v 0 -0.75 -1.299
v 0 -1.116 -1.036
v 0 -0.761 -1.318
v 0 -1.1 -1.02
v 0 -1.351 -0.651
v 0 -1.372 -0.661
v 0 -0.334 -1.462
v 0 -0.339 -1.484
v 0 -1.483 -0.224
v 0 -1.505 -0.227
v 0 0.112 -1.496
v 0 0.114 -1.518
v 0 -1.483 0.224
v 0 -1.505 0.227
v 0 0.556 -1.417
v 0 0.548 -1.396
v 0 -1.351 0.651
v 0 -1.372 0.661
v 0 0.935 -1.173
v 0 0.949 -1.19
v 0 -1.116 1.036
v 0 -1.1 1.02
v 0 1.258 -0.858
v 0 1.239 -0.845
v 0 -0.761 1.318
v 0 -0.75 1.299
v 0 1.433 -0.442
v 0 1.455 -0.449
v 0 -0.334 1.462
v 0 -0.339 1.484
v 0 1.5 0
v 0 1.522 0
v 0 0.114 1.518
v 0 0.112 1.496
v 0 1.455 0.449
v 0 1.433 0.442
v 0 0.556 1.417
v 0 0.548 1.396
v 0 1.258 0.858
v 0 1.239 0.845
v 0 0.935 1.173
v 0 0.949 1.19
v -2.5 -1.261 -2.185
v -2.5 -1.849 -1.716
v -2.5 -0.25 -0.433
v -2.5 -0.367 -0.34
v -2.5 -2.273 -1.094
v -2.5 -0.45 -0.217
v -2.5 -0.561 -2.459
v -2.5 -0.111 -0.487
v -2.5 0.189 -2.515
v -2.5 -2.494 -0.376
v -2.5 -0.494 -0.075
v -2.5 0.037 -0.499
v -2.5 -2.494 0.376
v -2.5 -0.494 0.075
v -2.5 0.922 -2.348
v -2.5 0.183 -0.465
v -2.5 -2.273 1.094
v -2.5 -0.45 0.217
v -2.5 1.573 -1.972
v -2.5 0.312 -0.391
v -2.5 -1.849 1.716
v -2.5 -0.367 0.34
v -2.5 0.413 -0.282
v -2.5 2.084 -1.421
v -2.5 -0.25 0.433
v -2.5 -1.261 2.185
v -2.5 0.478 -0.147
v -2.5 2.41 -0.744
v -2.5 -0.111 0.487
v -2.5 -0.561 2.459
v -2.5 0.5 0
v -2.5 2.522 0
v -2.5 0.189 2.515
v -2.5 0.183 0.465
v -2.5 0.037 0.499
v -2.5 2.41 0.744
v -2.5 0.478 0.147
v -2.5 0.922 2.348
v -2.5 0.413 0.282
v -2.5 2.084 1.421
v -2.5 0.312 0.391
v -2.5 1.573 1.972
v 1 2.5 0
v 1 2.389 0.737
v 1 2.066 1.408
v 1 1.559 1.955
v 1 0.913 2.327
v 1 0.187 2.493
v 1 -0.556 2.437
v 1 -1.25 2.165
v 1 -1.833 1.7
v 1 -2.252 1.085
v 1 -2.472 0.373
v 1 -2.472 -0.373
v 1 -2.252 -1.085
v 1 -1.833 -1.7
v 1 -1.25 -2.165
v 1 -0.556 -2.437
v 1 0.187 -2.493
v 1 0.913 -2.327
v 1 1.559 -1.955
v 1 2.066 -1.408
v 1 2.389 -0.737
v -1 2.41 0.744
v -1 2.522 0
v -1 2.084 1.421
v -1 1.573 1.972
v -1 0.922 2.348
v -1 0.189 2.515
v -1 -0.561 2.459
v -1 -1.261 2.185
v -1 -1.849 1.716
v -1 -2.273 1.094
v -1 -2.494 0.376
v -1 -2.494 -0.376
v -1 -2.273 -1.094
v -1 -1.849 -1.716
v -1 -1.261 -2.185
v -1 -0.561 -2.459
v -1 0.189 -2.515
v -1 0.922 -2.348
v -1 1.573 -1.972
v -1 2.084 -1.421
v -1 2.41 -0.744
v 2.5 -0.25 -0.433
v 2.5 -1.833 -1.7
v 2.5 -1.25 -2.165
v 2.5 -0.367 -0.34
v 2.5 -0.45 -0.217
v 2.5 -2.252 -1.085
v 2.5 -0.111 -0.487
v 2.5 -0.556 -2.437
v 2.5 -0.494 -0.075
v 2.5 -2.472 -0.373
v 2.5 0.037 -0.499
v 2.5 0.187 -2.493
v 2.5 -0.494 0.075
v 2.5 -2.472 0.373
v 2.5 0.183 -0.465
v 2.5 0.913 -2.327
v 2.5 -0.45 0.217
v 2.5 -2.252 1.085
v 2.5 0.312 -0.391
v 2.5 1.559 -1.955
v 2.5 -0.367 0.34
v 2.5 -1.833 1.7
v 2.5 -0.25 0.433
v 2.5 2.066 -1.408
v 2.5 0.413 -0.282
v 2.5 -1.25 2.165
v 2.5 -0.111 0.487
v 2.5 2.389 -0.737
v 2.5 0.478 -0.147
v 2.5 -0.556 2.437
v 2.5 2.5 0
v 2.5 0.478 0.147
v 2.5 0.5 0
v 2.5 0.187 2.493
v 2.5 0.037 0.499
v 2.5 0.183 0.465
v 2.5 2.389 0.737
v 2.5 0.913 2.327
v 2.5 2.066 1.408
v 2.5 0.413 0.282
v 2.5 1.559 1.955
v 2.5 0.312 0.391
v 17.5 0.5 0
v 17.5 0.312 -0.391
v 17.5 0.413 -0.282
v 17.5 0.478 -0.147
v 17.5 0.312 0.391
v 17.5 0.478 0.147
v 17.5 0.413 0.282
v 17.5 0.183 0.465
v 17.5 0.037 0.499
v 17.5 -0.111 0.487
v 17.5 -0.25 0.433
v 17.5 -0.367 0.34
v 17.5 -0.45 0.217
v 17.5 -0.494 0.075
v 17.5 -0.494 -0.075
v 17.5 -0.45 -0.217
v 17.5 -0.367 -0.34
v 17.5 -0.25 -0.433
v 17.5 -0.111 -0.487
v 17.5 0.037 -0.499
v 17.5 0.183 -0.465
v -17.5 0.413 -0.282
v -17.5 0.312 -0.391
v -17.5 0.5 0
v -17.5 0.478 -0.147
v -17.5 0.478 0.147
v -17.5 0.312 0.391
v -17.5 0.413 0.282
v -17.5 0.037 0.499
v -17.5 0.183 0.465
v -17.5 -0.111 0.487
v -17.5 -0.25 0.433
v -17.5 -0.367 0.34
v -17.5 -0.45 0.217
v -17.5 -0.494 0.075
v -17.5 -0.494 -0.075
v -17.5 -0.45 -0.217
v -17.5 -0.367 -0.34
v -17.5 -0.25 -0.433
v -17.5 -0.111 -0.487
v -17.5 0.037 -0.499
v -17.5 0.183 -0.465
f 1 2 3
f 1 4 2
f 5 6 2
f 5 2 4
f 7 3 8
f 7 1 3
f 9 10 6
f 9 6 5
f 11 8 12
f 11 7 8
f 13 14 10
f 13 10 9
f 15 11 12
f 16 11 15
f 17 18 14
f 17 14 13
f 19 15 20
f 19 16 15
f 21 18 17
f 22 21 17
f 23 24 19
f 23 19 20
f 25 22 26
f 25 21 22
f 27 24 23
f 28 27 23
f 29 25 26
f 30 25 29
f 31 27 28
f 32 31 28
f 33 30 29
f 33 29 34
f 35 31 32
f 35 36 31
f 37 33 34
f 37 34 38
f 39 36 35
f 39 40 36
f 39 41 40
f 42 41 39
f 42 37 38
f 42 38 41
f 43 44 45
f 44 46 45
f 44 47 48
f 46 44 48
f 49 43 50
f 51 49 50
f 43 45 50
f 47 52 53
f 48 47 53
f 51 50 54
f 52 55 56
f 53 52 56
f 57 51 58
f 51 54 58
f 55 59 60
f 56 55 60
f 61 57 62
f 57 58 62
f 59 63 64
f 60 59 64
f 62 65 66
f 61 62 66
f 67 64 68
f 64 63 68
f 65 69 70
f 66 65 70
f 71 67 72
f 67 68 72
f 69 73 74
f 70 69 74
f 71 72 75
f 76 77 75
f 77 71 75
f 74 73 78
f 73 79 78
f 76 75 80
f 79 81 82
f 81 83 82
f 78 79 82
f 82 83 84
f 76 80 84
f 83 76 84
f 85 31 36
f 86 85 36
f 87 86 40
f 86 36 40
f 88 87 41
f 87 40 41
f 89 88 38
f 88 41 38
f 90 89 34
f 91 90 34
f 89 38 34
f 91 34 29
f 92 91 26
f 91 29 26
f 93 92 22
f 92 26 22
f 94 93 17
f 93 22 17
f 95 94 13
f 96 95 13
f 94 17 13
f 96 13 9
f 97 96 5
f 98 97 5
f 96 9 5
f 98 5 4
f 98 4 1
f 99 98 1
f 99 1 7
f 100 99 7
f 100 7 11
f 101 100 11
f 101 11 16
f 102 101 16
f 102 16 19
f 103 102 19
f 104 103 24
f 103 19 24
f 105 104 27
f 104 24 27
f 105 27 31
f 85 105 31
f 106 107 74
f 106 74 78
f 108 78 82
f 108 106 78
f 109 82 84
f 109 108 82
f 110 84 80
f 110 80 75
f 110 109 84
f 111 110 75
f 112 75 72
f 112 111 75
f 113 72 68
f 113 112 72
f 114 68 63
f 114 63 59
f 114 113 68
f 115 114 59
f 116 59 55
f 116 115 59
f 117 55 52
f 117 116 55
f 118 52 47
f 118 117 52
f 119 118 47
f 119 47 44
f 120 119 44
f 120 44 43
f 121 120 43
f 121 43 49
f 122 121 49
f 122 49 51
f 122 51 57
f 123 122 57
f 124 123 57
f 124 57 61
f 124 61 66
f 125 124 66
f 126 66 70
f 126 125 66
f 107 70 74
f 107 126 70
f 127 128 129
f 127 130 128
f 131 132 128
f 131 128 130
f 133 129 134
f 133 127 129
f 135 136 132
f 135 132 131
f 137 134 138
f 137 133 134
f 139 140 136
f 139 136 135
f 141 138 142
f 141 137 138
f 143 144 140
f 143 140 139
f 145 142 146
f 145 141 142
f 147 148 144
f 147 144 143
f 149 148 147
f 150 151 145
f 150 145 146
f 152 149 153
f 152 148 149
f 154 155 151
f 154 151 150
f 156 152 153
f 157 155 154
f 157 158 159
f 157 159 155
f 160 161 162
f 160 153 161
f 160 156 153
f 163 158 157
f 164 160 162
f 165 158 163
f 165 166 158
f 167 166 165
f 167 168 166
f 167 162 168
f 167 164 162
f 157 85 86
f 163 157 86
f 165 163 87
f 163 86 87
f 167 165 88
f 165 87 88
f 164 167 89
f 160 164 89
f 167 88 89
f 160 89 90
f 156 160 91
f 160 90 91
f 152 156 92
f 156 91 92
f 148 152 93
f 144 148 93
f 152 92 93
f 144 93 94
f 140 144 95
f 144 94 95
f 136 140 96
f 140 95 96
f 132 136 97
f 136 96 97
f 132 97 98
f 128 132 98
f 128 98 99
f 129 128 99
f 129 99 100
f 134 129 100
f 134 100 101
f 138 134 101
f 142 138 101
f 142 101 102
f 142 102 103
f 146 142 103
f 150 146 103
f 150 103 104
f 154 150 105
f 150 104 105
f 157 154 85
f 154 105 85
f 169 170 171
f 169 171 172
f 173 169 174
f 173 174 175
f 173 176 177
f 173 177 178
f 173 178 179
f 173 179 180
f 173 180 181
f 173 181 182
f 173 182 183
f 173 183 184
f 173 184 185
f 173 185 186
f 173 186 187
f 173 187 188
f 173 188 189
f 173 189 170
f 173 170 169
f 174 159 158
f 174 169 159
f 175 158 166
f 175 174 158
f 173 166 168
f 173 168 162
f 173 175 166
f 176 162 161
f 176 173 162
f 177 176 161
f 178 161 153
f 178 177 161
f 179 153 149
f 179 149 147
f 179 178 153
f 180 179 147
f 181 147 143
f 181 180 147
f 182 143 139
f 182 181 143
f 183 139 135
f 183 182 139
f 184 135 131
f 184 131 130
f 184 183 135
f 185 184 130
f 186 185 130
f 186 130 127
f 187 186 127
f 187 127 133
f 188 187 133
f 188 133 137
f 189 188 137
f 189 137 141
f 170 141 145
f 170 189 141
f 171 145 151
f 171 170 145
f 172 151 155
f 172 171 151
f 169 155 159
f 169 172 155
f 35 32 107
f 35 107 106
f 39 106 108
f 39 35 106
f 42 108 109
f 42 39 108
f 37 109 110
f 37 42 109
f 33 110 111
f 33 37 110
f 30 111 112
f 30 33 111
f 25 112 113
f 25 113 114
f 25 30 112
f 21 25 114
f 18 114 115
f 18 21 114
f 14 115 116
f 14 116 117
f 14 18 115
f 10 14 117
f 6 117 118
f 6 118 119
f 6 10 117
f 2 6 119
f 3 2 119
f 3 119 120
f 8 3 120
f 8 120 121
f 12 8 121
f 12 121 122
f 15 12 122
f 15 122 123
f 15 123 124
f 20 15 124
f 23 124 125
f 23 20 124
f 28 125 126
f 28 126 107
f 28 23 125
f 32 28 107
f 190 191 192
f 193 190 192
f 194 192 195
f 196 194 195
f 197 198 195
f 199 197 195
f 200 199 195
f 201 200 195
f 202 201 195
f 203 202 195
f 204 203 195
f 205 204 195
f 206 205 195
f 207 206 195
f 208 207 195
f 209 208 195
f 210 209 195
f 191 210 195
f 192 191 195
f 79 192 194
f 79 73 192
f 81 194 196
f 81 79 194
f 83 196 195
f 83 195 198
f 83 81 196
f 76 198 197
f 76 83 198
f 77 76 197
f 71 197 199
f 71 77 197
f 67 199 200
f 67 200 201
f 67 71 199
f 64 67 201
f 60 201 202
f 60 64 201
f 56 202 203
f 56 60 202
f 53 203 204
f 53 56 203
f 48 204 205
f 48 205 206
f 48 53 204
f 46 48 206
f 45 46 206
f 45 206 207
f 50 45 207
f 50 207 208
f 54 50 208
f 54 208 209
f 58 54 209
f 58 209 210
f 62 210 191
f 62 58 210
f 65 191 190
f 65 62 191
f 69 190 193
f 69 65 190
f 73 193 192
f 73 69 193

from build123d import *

# Parameters (mm, degrees)
F0_R     = 0.5
F1_DEPTH = 17.5
F2_R     = 2.5
F3_DEPTH = 2.5
F4_SIZE  = 1
F5_R     = 2.522448
F6_DEPTH = 2.5
F7_SIZE  = 1


with BuildPart() as f1:
    # F0 (on Right) → F1 (new body, symmetric)
    with BuildSketch(Plane.YZ):
        Circle(F0_R)
    extrude(amount=F1_DEPTH, both=True)

    # F2 (on Right) → F3 (join)
    with BuildSketch(Plane.YZ):
        Circle(F2_R)
    extrude(amount=F3_DEPTH)

    # F4
    f4_edges = [f1.edges().sort_by_distance(p)[0] for p in [
        (0, -2.5, 0),
    ]]
    chamfer(f4_edges, length=F4_SIZE)

    # F5 (on Right) → F6 (join)
    with BuildSketch(Plane.YZ):
        Circle(F5_R)
    extrude(amount=-F6_DEPTH)

    # F7
    f7_edges = [f1.edges().sort_by_distance(p)[0] for p in [
        (0, -2.522448, 0),
    ]]
    chamfer(f7_edges, length=F7_SIZE)


solid = f1.part
